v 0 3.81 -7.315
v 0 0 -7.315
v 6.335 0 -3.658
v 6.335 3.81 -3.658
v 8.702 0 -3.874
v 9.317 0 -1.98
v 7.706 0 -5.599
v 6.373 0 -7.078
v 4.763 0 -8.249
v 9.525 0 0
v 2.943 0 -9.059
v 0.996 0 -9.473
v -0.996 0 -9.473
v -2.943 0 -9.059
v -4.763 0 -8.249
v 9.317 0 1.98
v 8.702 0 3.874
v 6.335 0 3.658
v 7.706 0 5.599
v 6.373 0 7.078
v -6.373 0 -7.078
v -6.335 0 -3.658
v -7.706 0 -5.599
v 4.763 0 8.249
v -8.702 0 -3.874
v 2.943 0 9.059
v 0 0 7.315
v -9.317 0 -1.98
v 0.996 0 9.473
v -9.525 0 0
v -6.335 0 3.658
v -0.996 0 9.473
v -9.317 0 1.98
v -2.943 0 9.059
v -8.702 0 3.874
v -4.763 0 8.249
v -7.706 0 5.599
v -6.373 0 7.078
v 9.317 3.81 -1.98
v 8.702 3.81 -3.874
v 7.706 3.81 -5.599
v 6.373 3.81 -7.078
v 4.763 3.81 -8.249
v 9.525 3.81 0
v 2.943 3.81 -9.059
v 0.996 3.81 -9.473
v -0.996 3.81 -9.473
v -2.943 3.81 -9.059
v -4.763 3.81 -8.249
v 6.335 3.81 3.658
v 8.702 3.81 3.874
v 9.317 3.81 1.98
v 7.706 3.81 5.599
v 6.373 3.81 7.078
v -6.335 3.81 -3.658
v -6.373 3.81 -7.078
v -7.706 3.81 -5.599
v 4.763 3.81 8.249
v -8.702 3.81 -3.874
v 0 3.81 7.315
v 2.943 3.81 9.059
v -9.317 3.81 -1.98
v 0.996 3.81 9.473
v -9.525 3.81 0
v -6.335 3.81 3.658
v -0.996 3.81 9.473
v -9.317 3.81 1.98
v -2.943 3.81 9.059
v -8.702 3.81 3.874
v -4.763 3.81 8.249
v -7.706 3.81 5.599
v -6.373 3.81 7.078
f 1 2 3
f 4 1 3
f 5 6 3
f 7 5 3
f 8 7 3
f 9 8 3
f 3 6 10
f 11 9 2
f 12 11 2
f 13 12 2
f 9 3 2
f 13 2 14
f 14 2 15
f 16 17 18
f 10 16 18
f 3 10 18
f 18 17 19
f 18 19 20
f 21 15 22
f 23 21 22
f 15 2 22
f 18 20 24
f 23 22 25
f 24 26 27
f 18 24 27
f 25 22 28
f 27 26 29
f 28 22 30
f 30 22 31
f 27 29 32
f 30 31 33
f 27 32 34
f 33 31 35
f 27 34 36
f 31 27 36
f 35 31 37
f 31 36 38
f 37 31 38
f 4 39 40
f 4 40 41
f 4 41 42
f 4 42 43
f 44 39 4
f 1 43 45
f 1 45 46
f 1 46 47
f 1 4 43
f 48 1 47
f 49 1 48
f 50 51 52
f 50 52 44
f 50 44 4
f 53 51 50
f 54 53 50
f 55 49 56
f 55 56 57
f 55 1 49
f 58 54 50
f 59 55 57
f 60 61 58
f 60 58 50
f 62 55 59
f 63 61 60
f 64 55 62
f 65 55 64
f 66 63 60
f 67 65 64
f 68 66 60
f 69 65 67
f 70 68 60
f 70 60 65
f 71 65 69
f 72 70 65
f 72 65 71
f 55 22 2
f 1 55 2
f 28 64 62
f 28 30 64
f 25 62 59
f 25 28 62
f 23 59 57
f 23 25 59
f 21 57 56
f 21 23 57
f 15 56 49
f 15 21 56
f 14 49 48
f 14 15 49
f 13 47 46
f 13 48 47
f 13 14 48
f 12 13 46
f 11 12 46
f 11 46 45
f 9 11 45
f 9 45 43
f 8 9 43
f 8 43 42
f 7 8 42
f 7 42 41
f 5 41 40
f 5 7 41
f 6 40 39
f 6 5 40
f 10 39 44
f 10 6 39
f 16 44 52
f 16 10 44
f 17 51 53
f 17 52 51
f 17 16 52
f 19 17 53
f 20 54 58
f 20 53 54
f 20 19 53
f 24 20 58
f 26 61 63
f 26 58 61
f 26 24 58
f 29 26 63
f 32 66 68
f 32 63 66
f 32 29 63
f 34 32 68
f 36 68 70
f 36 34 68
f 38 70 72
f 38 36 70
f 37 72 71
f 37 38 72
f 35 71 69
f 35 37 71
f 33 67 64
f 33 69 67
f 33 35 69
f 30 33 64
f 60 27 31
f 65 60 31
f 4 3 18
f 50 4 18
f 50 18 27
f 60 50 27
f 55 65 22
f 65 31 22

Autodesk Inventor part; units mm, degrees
ref_plane "YZ Plane" through (0, 0, 0) normal (1, 0, 0) x (0, 1, 0)
ref_plane "XZ Plane" through (0, 0, 0) normal (0, 1, 0) x (-1, 0, 0)
ref_plane "XY Plane" through (0, 0, 0) normal (0, 0, 1) x (1, 0, 0)
sketch "Sketch1" plane through (0, 0, 0) normal (0, 1, 0) x (-1, 0, 0)
  circle A0 centre (0, 0) radius 9.525
  line L0 (0, -7.3152) -> (-6.3351, -3.6576)
  line L1 (-6.3351, -3.6576) -> (-6.3351, 3.6576)
  line L2 (-6.3351, 3.6576) -> (0, 7.3152)
  line L3 (0, 7.3152) -> (6.3351, 3.6576)
  line L4 (6.3351, 3.6576) -> (6.3351, -3.6576)
  line L5 (6.3351, -3.6576) -> (0, -7.3152)
  dimension "d0" = 19.05
  dimension "d1" = 7.3152
extrude "Extrusion1" add sketch "Sketch1" along normal blind 3.81
